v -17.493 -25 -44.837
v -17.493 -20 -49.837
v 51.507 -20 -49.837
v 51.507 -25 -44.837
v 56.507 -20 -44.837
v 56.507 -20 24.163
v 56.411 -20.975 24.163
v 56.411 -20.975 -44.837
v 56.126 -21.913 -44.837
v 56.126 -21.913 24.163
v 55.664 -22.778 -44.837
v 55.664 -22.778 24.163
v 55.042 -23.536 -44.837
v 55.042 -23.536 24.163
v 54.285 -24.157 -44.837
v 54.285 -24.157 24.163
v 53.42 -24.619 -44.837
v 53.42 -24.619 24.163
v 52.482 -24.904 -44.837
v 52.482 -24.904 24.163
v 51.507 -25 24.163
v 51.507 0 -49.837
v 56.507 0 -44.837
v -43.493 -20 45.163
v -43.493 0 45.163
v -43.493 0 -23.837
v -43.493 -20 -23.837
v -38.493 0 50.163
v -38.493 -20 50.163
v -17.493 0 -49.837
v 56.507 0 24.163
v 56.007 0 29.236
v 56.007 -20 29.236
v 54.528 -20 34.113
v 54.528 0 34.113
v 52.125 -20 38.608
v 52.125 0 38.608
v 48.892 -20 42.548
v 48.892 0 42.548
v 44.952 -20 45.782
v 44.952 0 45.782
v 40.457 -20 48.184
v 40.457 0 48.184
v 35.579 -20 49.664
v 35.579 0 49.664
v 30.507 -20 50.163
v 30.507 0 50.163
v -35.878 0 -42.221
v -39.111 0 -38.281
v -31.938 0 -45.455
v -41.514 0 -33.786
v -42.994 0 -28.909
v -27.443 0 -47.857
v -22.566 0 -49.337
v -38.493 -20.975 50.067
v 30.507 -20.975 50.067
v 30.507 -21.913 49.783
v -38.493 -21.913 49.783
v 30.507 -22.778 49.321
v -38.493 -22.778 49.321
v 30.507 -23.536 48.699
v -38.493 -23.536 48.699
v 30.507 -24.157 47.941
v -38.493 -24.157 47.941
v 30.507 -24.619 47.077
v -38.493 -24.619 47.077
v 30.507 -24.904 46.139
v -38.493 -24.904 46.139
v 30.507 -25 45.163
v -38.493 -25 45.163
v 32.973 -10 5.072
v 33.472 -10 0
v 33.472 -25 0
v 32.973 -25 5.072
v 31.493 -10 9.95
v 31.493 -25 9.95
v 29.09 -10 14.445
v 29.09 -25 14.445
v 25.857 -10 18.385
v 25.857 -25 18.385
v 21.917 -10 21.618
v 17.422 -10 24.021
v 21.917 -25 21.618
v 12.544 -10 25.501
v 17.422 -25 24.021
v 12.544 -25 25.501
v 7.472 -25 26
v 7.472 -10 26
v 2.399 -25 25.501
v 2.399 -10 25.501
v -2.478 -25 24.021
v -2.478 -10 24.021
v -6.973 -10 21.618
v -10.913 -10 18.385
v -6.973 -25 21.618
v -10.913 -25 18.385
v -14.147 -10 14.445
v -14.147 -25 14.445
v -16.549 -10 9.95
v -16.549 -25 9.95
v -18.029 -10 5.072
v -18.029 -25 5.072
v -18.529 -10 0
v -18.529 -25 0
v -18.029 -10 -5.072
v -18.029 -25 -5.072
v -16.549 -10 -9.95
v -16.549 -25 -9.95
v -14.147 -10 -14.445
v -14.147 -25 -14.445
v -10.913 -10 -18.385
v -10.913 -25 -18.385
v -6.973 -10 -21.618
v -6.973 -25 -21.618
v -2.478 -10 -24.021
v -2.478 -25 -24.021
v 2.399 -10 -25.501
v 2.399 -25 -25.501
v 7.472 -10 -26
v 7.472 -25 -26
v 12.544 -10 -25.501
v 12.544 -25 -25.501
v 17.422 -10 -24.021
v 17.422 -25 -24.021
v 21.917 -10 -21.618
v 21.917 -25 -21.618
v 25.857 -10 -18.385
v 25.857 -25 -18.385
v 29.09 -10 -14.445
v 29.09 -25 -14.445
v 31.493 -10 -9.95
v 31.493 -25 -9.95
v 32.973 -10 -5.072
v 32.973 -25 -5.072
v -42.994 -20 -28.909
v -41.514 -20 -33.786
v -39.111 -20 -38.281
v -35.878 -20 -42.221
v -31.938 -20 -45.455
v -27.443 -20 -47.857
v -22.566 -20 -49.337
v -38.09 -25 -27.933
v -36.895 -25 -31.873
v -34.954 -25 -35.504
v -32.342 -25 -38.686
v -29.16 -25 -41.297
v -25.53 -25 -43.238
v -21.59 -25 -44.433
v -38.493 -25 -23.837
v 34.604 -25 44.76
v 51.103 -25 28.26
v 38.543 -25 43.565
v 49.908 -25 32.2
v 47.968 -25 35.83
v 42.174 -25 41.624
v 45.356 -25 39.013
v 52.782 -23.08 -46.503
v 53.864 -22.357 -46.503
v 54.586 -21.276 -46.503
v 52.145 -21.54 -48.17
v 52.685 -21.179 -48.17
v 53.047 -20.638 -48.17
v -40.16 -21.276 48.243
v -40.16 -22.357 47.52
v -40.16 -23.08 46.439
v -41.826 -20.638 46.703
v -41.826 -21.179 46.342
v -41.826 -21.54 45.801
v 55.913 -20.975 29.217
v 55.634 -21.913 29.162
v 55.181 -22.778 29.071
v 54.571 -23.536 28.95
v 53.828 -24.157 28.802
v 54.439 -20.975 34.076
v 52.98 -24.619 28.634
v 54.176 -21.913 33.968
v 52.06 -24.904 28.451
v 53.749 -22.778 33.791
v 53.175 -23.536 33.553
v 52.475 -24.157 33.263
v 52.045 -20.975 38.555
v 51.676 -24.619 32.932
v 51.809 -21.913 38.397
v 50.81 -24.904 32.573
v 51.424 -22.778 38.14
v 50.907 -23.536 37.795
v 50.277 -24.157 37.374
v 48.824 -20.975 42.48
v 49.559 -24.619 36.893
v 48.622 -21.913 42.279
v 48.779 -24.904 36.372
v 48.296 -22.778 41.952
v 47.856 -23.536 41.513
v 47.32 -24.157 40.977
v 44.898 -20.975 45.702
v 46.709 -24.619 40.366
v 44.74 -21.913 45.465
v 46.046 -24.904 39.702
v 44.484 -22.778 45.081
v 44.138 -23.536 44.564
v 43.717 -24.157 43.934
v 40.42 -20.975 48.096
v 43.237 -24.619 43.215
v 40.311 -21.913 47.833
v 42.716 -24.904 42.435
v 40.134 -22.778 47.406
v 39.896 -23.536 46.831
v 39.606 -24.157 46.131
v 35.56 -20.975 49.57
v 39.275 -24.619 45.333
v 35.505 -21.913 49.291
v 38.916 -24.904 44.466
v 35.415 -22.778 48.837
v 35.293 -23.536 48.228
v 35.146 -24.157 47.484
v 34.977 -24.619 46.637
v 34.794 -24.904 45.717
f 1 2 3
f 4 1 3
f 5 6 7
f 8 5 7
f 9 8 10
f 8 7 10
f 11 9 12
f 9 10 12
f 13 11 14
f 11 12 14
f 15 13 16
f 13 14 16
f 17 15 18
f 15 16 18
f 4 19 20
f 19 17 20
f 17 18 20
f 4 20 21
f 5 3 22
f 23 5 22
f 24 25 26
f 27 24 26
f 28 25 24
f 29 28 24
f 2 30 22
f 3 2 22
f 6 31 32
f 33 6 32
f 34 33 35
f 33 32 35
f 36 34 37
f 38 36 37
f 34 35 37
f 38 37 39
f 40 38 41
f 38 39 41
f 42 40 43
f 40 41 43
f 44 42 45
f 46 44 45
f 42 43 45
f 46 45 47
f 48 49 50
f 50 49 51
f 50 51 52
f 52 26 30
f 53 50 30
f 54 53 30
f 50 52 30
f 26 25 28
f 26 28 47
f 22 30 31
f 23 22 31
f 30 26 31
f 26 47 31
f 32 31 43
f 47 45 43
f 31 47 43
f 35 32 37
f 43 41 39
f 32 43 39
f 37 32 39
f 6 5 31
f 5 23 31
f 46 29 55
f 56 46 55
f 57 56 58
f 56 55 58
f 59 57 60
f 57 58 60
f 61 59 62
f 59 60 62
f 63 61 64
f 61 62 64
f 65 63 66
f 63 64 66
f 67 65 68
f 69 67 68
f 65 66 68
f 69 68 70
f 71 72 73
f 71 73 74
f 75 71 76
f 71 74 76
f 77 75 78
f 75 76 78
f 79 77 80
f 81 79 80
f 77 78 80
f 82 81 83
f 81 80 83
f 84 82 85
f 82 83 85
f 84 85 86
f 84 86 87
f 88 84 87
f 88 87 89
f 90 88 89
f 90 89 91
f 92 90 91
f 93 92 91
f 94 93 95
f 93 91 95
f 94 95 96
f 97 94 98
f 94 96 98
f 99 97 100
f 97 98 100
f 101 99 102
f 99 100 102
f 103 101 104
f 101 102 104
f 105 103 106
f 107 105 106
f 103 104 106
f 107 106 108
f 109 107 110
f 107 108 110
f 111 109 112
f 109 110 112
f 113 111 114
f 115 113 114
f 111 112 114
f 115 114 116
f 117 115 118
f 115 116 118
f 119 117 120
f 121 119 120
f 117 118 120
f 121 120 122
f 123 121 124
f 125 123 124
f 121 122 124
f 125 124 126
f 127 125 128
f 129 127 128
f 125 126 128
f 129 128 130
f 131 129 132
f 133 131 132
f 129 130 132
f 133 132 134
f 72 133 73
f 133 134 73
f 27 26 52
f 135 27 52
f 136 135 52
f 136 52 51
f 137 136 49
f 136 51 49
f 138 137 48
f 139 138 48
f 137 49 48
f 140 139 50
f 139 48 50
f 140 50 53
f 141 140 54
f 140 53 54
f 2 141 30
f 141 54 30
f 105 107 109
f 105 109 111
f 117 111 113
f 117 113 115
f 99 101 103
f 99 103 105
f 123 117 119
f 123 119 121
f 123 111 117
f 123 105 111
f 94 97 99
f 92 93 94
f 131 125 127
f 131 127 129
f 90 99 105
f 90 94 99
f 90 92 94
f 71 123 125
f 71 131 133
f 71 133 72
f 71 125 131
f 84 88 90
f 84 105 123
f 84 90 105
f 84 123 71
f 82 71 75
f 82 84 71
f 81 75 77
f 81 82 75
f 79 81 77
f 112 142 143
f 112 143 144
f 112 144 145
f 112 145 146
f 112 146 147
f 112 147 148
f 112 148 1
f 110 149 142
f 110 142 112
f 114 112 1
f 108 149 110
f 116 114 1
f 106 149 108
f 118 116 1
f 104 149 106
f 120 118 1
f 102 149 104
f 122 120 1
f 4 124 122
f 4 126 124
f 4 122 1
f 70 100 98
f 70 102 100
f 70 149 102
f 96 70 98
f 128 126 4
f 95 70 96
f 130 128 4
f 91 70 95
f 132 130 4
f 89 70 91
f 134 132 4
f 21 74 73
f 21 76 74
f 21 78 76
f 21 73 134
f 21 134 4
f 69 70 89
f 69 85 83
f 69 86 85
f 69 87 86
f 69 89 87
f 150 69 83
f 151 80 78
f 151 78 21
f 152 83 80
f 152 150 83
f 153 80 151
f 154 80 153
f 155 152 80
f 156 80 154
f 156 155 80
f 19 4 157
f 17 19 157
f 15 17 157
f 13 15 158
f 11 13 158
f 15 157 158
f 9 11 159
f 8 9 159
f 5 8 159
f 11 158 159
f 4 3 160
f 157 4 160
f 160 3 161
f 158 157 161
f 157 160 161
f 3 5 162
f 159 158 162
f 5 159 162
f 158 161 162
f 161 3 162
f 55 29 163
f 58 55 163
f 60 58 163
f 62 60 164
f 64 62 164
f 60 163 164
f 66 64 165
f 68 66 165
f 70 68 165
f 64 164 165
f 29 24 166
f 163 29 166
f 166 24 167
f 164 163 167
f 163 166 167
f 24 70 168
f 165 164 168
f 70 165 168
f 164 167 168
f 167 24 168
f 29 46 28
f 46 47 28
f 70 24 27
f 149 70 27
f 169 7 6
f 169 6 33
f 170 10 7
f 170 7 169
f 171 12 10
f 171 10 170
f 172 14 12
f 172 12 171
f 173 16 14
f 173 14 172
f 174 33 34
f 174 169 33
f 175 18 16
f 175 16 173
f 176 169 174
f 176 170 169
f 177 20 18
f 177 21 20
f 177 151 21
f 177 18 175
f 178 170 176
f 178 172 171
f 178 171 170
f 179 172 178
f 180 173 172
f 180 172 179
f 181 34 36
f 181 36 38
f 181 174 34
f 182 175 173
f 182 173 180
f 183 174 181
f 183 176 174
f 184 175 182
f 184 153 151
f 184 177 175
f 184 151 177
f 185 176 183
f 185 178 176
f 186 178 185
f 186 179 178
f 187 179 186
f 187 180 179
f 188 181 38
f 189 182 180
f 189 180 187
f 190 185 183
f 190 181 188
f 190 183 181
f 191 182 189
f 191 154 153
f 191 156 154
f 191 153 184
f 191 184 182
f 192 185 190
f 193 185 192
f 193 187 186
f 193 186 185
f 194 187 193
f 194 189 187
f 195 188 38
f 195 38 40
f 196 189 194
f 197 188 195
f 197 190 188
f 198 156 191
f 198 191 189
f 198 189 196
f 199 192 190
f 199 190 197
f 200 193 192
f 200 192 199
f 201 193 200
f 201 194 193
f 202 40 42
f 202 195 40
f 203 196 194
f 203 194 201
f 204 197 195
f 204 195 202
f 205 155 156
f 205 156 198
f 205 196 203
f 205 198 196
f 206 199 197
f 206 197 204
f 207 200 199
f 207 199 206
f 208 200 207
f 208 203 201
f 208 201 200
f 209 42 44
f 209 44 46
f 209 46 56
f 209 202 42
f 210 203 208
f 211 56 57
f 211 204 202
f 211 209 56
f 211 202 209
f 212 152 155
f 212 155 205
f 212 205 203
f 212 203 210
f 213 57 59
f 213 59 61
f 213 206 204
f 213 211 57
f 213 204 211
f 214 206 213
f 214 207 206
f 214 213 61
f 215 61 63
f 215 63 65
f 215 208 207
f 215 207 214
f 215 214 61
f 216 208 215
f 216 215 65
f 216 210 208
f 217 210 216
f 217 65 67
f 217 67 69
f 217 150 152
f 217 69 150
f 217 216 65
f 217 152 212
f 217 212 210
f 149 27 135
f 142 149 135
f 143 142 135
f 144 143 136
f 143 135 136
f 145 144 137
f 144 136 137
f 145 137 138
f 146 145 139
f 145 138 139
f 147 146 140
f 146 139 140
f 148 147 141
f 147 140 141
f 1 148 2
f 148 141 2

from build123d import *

# Parameters (mm, degrees)
F1_DEPTH = 25
F2_R     = 5
F3_SIZE  = 5
F4_R     = 26.000333
F5_DEPTH = 15


with BuildPart() as f1:
    # F0 (on Front) → F1 (new body)
    with BuildSketch(Plane.XZ):
        with BuildLine():
            Line((30.506836, 50.163411), (-43.493164, 50.163411))
            Line((-43.493164, 50.163411), (-43.493164, -23.836589))
            ThreePointArc((-43.493164, -23.836589), (-35.87794, -42.221365), (-17.493164, -49.836589))
            Line((-17.493164, -49.836589), (56.506836, -49.836589))
            Line((56.506836, -49.836589), (56.506836, 24.163411))
            ThreePointArc((56.506836, 24.163411), (48.891612, 42.548187), (30.506836, 50.163411))
        make_face()
    extrude(amount=F1_DEPTH)

    # F2
    f2_edges = [f1.edges().sort_by_distance(p)[0] for p in [
        (-6.493164, -25, 50.163411),
    ]]
    fillet(f2_edges, radius=F2_R)

    # F3
    f3_edges = [f1.edges().sort_by_distance(p)[0] for p in [
        (-43.493164, -10, 50.163411),
    ]]
    chamfer(f3_edges, length=F3_SIZE)

    # F4 (on face) → F5 (cut)
    with BuildSketch(Plane.XZ.offset(25)):
        with Locations((7.471764, 0)):
            Circle(F4_R)
    extrude(amount=-F5_DEPTH, mode=Mode.SUBTRACT)


solid = f1.part
